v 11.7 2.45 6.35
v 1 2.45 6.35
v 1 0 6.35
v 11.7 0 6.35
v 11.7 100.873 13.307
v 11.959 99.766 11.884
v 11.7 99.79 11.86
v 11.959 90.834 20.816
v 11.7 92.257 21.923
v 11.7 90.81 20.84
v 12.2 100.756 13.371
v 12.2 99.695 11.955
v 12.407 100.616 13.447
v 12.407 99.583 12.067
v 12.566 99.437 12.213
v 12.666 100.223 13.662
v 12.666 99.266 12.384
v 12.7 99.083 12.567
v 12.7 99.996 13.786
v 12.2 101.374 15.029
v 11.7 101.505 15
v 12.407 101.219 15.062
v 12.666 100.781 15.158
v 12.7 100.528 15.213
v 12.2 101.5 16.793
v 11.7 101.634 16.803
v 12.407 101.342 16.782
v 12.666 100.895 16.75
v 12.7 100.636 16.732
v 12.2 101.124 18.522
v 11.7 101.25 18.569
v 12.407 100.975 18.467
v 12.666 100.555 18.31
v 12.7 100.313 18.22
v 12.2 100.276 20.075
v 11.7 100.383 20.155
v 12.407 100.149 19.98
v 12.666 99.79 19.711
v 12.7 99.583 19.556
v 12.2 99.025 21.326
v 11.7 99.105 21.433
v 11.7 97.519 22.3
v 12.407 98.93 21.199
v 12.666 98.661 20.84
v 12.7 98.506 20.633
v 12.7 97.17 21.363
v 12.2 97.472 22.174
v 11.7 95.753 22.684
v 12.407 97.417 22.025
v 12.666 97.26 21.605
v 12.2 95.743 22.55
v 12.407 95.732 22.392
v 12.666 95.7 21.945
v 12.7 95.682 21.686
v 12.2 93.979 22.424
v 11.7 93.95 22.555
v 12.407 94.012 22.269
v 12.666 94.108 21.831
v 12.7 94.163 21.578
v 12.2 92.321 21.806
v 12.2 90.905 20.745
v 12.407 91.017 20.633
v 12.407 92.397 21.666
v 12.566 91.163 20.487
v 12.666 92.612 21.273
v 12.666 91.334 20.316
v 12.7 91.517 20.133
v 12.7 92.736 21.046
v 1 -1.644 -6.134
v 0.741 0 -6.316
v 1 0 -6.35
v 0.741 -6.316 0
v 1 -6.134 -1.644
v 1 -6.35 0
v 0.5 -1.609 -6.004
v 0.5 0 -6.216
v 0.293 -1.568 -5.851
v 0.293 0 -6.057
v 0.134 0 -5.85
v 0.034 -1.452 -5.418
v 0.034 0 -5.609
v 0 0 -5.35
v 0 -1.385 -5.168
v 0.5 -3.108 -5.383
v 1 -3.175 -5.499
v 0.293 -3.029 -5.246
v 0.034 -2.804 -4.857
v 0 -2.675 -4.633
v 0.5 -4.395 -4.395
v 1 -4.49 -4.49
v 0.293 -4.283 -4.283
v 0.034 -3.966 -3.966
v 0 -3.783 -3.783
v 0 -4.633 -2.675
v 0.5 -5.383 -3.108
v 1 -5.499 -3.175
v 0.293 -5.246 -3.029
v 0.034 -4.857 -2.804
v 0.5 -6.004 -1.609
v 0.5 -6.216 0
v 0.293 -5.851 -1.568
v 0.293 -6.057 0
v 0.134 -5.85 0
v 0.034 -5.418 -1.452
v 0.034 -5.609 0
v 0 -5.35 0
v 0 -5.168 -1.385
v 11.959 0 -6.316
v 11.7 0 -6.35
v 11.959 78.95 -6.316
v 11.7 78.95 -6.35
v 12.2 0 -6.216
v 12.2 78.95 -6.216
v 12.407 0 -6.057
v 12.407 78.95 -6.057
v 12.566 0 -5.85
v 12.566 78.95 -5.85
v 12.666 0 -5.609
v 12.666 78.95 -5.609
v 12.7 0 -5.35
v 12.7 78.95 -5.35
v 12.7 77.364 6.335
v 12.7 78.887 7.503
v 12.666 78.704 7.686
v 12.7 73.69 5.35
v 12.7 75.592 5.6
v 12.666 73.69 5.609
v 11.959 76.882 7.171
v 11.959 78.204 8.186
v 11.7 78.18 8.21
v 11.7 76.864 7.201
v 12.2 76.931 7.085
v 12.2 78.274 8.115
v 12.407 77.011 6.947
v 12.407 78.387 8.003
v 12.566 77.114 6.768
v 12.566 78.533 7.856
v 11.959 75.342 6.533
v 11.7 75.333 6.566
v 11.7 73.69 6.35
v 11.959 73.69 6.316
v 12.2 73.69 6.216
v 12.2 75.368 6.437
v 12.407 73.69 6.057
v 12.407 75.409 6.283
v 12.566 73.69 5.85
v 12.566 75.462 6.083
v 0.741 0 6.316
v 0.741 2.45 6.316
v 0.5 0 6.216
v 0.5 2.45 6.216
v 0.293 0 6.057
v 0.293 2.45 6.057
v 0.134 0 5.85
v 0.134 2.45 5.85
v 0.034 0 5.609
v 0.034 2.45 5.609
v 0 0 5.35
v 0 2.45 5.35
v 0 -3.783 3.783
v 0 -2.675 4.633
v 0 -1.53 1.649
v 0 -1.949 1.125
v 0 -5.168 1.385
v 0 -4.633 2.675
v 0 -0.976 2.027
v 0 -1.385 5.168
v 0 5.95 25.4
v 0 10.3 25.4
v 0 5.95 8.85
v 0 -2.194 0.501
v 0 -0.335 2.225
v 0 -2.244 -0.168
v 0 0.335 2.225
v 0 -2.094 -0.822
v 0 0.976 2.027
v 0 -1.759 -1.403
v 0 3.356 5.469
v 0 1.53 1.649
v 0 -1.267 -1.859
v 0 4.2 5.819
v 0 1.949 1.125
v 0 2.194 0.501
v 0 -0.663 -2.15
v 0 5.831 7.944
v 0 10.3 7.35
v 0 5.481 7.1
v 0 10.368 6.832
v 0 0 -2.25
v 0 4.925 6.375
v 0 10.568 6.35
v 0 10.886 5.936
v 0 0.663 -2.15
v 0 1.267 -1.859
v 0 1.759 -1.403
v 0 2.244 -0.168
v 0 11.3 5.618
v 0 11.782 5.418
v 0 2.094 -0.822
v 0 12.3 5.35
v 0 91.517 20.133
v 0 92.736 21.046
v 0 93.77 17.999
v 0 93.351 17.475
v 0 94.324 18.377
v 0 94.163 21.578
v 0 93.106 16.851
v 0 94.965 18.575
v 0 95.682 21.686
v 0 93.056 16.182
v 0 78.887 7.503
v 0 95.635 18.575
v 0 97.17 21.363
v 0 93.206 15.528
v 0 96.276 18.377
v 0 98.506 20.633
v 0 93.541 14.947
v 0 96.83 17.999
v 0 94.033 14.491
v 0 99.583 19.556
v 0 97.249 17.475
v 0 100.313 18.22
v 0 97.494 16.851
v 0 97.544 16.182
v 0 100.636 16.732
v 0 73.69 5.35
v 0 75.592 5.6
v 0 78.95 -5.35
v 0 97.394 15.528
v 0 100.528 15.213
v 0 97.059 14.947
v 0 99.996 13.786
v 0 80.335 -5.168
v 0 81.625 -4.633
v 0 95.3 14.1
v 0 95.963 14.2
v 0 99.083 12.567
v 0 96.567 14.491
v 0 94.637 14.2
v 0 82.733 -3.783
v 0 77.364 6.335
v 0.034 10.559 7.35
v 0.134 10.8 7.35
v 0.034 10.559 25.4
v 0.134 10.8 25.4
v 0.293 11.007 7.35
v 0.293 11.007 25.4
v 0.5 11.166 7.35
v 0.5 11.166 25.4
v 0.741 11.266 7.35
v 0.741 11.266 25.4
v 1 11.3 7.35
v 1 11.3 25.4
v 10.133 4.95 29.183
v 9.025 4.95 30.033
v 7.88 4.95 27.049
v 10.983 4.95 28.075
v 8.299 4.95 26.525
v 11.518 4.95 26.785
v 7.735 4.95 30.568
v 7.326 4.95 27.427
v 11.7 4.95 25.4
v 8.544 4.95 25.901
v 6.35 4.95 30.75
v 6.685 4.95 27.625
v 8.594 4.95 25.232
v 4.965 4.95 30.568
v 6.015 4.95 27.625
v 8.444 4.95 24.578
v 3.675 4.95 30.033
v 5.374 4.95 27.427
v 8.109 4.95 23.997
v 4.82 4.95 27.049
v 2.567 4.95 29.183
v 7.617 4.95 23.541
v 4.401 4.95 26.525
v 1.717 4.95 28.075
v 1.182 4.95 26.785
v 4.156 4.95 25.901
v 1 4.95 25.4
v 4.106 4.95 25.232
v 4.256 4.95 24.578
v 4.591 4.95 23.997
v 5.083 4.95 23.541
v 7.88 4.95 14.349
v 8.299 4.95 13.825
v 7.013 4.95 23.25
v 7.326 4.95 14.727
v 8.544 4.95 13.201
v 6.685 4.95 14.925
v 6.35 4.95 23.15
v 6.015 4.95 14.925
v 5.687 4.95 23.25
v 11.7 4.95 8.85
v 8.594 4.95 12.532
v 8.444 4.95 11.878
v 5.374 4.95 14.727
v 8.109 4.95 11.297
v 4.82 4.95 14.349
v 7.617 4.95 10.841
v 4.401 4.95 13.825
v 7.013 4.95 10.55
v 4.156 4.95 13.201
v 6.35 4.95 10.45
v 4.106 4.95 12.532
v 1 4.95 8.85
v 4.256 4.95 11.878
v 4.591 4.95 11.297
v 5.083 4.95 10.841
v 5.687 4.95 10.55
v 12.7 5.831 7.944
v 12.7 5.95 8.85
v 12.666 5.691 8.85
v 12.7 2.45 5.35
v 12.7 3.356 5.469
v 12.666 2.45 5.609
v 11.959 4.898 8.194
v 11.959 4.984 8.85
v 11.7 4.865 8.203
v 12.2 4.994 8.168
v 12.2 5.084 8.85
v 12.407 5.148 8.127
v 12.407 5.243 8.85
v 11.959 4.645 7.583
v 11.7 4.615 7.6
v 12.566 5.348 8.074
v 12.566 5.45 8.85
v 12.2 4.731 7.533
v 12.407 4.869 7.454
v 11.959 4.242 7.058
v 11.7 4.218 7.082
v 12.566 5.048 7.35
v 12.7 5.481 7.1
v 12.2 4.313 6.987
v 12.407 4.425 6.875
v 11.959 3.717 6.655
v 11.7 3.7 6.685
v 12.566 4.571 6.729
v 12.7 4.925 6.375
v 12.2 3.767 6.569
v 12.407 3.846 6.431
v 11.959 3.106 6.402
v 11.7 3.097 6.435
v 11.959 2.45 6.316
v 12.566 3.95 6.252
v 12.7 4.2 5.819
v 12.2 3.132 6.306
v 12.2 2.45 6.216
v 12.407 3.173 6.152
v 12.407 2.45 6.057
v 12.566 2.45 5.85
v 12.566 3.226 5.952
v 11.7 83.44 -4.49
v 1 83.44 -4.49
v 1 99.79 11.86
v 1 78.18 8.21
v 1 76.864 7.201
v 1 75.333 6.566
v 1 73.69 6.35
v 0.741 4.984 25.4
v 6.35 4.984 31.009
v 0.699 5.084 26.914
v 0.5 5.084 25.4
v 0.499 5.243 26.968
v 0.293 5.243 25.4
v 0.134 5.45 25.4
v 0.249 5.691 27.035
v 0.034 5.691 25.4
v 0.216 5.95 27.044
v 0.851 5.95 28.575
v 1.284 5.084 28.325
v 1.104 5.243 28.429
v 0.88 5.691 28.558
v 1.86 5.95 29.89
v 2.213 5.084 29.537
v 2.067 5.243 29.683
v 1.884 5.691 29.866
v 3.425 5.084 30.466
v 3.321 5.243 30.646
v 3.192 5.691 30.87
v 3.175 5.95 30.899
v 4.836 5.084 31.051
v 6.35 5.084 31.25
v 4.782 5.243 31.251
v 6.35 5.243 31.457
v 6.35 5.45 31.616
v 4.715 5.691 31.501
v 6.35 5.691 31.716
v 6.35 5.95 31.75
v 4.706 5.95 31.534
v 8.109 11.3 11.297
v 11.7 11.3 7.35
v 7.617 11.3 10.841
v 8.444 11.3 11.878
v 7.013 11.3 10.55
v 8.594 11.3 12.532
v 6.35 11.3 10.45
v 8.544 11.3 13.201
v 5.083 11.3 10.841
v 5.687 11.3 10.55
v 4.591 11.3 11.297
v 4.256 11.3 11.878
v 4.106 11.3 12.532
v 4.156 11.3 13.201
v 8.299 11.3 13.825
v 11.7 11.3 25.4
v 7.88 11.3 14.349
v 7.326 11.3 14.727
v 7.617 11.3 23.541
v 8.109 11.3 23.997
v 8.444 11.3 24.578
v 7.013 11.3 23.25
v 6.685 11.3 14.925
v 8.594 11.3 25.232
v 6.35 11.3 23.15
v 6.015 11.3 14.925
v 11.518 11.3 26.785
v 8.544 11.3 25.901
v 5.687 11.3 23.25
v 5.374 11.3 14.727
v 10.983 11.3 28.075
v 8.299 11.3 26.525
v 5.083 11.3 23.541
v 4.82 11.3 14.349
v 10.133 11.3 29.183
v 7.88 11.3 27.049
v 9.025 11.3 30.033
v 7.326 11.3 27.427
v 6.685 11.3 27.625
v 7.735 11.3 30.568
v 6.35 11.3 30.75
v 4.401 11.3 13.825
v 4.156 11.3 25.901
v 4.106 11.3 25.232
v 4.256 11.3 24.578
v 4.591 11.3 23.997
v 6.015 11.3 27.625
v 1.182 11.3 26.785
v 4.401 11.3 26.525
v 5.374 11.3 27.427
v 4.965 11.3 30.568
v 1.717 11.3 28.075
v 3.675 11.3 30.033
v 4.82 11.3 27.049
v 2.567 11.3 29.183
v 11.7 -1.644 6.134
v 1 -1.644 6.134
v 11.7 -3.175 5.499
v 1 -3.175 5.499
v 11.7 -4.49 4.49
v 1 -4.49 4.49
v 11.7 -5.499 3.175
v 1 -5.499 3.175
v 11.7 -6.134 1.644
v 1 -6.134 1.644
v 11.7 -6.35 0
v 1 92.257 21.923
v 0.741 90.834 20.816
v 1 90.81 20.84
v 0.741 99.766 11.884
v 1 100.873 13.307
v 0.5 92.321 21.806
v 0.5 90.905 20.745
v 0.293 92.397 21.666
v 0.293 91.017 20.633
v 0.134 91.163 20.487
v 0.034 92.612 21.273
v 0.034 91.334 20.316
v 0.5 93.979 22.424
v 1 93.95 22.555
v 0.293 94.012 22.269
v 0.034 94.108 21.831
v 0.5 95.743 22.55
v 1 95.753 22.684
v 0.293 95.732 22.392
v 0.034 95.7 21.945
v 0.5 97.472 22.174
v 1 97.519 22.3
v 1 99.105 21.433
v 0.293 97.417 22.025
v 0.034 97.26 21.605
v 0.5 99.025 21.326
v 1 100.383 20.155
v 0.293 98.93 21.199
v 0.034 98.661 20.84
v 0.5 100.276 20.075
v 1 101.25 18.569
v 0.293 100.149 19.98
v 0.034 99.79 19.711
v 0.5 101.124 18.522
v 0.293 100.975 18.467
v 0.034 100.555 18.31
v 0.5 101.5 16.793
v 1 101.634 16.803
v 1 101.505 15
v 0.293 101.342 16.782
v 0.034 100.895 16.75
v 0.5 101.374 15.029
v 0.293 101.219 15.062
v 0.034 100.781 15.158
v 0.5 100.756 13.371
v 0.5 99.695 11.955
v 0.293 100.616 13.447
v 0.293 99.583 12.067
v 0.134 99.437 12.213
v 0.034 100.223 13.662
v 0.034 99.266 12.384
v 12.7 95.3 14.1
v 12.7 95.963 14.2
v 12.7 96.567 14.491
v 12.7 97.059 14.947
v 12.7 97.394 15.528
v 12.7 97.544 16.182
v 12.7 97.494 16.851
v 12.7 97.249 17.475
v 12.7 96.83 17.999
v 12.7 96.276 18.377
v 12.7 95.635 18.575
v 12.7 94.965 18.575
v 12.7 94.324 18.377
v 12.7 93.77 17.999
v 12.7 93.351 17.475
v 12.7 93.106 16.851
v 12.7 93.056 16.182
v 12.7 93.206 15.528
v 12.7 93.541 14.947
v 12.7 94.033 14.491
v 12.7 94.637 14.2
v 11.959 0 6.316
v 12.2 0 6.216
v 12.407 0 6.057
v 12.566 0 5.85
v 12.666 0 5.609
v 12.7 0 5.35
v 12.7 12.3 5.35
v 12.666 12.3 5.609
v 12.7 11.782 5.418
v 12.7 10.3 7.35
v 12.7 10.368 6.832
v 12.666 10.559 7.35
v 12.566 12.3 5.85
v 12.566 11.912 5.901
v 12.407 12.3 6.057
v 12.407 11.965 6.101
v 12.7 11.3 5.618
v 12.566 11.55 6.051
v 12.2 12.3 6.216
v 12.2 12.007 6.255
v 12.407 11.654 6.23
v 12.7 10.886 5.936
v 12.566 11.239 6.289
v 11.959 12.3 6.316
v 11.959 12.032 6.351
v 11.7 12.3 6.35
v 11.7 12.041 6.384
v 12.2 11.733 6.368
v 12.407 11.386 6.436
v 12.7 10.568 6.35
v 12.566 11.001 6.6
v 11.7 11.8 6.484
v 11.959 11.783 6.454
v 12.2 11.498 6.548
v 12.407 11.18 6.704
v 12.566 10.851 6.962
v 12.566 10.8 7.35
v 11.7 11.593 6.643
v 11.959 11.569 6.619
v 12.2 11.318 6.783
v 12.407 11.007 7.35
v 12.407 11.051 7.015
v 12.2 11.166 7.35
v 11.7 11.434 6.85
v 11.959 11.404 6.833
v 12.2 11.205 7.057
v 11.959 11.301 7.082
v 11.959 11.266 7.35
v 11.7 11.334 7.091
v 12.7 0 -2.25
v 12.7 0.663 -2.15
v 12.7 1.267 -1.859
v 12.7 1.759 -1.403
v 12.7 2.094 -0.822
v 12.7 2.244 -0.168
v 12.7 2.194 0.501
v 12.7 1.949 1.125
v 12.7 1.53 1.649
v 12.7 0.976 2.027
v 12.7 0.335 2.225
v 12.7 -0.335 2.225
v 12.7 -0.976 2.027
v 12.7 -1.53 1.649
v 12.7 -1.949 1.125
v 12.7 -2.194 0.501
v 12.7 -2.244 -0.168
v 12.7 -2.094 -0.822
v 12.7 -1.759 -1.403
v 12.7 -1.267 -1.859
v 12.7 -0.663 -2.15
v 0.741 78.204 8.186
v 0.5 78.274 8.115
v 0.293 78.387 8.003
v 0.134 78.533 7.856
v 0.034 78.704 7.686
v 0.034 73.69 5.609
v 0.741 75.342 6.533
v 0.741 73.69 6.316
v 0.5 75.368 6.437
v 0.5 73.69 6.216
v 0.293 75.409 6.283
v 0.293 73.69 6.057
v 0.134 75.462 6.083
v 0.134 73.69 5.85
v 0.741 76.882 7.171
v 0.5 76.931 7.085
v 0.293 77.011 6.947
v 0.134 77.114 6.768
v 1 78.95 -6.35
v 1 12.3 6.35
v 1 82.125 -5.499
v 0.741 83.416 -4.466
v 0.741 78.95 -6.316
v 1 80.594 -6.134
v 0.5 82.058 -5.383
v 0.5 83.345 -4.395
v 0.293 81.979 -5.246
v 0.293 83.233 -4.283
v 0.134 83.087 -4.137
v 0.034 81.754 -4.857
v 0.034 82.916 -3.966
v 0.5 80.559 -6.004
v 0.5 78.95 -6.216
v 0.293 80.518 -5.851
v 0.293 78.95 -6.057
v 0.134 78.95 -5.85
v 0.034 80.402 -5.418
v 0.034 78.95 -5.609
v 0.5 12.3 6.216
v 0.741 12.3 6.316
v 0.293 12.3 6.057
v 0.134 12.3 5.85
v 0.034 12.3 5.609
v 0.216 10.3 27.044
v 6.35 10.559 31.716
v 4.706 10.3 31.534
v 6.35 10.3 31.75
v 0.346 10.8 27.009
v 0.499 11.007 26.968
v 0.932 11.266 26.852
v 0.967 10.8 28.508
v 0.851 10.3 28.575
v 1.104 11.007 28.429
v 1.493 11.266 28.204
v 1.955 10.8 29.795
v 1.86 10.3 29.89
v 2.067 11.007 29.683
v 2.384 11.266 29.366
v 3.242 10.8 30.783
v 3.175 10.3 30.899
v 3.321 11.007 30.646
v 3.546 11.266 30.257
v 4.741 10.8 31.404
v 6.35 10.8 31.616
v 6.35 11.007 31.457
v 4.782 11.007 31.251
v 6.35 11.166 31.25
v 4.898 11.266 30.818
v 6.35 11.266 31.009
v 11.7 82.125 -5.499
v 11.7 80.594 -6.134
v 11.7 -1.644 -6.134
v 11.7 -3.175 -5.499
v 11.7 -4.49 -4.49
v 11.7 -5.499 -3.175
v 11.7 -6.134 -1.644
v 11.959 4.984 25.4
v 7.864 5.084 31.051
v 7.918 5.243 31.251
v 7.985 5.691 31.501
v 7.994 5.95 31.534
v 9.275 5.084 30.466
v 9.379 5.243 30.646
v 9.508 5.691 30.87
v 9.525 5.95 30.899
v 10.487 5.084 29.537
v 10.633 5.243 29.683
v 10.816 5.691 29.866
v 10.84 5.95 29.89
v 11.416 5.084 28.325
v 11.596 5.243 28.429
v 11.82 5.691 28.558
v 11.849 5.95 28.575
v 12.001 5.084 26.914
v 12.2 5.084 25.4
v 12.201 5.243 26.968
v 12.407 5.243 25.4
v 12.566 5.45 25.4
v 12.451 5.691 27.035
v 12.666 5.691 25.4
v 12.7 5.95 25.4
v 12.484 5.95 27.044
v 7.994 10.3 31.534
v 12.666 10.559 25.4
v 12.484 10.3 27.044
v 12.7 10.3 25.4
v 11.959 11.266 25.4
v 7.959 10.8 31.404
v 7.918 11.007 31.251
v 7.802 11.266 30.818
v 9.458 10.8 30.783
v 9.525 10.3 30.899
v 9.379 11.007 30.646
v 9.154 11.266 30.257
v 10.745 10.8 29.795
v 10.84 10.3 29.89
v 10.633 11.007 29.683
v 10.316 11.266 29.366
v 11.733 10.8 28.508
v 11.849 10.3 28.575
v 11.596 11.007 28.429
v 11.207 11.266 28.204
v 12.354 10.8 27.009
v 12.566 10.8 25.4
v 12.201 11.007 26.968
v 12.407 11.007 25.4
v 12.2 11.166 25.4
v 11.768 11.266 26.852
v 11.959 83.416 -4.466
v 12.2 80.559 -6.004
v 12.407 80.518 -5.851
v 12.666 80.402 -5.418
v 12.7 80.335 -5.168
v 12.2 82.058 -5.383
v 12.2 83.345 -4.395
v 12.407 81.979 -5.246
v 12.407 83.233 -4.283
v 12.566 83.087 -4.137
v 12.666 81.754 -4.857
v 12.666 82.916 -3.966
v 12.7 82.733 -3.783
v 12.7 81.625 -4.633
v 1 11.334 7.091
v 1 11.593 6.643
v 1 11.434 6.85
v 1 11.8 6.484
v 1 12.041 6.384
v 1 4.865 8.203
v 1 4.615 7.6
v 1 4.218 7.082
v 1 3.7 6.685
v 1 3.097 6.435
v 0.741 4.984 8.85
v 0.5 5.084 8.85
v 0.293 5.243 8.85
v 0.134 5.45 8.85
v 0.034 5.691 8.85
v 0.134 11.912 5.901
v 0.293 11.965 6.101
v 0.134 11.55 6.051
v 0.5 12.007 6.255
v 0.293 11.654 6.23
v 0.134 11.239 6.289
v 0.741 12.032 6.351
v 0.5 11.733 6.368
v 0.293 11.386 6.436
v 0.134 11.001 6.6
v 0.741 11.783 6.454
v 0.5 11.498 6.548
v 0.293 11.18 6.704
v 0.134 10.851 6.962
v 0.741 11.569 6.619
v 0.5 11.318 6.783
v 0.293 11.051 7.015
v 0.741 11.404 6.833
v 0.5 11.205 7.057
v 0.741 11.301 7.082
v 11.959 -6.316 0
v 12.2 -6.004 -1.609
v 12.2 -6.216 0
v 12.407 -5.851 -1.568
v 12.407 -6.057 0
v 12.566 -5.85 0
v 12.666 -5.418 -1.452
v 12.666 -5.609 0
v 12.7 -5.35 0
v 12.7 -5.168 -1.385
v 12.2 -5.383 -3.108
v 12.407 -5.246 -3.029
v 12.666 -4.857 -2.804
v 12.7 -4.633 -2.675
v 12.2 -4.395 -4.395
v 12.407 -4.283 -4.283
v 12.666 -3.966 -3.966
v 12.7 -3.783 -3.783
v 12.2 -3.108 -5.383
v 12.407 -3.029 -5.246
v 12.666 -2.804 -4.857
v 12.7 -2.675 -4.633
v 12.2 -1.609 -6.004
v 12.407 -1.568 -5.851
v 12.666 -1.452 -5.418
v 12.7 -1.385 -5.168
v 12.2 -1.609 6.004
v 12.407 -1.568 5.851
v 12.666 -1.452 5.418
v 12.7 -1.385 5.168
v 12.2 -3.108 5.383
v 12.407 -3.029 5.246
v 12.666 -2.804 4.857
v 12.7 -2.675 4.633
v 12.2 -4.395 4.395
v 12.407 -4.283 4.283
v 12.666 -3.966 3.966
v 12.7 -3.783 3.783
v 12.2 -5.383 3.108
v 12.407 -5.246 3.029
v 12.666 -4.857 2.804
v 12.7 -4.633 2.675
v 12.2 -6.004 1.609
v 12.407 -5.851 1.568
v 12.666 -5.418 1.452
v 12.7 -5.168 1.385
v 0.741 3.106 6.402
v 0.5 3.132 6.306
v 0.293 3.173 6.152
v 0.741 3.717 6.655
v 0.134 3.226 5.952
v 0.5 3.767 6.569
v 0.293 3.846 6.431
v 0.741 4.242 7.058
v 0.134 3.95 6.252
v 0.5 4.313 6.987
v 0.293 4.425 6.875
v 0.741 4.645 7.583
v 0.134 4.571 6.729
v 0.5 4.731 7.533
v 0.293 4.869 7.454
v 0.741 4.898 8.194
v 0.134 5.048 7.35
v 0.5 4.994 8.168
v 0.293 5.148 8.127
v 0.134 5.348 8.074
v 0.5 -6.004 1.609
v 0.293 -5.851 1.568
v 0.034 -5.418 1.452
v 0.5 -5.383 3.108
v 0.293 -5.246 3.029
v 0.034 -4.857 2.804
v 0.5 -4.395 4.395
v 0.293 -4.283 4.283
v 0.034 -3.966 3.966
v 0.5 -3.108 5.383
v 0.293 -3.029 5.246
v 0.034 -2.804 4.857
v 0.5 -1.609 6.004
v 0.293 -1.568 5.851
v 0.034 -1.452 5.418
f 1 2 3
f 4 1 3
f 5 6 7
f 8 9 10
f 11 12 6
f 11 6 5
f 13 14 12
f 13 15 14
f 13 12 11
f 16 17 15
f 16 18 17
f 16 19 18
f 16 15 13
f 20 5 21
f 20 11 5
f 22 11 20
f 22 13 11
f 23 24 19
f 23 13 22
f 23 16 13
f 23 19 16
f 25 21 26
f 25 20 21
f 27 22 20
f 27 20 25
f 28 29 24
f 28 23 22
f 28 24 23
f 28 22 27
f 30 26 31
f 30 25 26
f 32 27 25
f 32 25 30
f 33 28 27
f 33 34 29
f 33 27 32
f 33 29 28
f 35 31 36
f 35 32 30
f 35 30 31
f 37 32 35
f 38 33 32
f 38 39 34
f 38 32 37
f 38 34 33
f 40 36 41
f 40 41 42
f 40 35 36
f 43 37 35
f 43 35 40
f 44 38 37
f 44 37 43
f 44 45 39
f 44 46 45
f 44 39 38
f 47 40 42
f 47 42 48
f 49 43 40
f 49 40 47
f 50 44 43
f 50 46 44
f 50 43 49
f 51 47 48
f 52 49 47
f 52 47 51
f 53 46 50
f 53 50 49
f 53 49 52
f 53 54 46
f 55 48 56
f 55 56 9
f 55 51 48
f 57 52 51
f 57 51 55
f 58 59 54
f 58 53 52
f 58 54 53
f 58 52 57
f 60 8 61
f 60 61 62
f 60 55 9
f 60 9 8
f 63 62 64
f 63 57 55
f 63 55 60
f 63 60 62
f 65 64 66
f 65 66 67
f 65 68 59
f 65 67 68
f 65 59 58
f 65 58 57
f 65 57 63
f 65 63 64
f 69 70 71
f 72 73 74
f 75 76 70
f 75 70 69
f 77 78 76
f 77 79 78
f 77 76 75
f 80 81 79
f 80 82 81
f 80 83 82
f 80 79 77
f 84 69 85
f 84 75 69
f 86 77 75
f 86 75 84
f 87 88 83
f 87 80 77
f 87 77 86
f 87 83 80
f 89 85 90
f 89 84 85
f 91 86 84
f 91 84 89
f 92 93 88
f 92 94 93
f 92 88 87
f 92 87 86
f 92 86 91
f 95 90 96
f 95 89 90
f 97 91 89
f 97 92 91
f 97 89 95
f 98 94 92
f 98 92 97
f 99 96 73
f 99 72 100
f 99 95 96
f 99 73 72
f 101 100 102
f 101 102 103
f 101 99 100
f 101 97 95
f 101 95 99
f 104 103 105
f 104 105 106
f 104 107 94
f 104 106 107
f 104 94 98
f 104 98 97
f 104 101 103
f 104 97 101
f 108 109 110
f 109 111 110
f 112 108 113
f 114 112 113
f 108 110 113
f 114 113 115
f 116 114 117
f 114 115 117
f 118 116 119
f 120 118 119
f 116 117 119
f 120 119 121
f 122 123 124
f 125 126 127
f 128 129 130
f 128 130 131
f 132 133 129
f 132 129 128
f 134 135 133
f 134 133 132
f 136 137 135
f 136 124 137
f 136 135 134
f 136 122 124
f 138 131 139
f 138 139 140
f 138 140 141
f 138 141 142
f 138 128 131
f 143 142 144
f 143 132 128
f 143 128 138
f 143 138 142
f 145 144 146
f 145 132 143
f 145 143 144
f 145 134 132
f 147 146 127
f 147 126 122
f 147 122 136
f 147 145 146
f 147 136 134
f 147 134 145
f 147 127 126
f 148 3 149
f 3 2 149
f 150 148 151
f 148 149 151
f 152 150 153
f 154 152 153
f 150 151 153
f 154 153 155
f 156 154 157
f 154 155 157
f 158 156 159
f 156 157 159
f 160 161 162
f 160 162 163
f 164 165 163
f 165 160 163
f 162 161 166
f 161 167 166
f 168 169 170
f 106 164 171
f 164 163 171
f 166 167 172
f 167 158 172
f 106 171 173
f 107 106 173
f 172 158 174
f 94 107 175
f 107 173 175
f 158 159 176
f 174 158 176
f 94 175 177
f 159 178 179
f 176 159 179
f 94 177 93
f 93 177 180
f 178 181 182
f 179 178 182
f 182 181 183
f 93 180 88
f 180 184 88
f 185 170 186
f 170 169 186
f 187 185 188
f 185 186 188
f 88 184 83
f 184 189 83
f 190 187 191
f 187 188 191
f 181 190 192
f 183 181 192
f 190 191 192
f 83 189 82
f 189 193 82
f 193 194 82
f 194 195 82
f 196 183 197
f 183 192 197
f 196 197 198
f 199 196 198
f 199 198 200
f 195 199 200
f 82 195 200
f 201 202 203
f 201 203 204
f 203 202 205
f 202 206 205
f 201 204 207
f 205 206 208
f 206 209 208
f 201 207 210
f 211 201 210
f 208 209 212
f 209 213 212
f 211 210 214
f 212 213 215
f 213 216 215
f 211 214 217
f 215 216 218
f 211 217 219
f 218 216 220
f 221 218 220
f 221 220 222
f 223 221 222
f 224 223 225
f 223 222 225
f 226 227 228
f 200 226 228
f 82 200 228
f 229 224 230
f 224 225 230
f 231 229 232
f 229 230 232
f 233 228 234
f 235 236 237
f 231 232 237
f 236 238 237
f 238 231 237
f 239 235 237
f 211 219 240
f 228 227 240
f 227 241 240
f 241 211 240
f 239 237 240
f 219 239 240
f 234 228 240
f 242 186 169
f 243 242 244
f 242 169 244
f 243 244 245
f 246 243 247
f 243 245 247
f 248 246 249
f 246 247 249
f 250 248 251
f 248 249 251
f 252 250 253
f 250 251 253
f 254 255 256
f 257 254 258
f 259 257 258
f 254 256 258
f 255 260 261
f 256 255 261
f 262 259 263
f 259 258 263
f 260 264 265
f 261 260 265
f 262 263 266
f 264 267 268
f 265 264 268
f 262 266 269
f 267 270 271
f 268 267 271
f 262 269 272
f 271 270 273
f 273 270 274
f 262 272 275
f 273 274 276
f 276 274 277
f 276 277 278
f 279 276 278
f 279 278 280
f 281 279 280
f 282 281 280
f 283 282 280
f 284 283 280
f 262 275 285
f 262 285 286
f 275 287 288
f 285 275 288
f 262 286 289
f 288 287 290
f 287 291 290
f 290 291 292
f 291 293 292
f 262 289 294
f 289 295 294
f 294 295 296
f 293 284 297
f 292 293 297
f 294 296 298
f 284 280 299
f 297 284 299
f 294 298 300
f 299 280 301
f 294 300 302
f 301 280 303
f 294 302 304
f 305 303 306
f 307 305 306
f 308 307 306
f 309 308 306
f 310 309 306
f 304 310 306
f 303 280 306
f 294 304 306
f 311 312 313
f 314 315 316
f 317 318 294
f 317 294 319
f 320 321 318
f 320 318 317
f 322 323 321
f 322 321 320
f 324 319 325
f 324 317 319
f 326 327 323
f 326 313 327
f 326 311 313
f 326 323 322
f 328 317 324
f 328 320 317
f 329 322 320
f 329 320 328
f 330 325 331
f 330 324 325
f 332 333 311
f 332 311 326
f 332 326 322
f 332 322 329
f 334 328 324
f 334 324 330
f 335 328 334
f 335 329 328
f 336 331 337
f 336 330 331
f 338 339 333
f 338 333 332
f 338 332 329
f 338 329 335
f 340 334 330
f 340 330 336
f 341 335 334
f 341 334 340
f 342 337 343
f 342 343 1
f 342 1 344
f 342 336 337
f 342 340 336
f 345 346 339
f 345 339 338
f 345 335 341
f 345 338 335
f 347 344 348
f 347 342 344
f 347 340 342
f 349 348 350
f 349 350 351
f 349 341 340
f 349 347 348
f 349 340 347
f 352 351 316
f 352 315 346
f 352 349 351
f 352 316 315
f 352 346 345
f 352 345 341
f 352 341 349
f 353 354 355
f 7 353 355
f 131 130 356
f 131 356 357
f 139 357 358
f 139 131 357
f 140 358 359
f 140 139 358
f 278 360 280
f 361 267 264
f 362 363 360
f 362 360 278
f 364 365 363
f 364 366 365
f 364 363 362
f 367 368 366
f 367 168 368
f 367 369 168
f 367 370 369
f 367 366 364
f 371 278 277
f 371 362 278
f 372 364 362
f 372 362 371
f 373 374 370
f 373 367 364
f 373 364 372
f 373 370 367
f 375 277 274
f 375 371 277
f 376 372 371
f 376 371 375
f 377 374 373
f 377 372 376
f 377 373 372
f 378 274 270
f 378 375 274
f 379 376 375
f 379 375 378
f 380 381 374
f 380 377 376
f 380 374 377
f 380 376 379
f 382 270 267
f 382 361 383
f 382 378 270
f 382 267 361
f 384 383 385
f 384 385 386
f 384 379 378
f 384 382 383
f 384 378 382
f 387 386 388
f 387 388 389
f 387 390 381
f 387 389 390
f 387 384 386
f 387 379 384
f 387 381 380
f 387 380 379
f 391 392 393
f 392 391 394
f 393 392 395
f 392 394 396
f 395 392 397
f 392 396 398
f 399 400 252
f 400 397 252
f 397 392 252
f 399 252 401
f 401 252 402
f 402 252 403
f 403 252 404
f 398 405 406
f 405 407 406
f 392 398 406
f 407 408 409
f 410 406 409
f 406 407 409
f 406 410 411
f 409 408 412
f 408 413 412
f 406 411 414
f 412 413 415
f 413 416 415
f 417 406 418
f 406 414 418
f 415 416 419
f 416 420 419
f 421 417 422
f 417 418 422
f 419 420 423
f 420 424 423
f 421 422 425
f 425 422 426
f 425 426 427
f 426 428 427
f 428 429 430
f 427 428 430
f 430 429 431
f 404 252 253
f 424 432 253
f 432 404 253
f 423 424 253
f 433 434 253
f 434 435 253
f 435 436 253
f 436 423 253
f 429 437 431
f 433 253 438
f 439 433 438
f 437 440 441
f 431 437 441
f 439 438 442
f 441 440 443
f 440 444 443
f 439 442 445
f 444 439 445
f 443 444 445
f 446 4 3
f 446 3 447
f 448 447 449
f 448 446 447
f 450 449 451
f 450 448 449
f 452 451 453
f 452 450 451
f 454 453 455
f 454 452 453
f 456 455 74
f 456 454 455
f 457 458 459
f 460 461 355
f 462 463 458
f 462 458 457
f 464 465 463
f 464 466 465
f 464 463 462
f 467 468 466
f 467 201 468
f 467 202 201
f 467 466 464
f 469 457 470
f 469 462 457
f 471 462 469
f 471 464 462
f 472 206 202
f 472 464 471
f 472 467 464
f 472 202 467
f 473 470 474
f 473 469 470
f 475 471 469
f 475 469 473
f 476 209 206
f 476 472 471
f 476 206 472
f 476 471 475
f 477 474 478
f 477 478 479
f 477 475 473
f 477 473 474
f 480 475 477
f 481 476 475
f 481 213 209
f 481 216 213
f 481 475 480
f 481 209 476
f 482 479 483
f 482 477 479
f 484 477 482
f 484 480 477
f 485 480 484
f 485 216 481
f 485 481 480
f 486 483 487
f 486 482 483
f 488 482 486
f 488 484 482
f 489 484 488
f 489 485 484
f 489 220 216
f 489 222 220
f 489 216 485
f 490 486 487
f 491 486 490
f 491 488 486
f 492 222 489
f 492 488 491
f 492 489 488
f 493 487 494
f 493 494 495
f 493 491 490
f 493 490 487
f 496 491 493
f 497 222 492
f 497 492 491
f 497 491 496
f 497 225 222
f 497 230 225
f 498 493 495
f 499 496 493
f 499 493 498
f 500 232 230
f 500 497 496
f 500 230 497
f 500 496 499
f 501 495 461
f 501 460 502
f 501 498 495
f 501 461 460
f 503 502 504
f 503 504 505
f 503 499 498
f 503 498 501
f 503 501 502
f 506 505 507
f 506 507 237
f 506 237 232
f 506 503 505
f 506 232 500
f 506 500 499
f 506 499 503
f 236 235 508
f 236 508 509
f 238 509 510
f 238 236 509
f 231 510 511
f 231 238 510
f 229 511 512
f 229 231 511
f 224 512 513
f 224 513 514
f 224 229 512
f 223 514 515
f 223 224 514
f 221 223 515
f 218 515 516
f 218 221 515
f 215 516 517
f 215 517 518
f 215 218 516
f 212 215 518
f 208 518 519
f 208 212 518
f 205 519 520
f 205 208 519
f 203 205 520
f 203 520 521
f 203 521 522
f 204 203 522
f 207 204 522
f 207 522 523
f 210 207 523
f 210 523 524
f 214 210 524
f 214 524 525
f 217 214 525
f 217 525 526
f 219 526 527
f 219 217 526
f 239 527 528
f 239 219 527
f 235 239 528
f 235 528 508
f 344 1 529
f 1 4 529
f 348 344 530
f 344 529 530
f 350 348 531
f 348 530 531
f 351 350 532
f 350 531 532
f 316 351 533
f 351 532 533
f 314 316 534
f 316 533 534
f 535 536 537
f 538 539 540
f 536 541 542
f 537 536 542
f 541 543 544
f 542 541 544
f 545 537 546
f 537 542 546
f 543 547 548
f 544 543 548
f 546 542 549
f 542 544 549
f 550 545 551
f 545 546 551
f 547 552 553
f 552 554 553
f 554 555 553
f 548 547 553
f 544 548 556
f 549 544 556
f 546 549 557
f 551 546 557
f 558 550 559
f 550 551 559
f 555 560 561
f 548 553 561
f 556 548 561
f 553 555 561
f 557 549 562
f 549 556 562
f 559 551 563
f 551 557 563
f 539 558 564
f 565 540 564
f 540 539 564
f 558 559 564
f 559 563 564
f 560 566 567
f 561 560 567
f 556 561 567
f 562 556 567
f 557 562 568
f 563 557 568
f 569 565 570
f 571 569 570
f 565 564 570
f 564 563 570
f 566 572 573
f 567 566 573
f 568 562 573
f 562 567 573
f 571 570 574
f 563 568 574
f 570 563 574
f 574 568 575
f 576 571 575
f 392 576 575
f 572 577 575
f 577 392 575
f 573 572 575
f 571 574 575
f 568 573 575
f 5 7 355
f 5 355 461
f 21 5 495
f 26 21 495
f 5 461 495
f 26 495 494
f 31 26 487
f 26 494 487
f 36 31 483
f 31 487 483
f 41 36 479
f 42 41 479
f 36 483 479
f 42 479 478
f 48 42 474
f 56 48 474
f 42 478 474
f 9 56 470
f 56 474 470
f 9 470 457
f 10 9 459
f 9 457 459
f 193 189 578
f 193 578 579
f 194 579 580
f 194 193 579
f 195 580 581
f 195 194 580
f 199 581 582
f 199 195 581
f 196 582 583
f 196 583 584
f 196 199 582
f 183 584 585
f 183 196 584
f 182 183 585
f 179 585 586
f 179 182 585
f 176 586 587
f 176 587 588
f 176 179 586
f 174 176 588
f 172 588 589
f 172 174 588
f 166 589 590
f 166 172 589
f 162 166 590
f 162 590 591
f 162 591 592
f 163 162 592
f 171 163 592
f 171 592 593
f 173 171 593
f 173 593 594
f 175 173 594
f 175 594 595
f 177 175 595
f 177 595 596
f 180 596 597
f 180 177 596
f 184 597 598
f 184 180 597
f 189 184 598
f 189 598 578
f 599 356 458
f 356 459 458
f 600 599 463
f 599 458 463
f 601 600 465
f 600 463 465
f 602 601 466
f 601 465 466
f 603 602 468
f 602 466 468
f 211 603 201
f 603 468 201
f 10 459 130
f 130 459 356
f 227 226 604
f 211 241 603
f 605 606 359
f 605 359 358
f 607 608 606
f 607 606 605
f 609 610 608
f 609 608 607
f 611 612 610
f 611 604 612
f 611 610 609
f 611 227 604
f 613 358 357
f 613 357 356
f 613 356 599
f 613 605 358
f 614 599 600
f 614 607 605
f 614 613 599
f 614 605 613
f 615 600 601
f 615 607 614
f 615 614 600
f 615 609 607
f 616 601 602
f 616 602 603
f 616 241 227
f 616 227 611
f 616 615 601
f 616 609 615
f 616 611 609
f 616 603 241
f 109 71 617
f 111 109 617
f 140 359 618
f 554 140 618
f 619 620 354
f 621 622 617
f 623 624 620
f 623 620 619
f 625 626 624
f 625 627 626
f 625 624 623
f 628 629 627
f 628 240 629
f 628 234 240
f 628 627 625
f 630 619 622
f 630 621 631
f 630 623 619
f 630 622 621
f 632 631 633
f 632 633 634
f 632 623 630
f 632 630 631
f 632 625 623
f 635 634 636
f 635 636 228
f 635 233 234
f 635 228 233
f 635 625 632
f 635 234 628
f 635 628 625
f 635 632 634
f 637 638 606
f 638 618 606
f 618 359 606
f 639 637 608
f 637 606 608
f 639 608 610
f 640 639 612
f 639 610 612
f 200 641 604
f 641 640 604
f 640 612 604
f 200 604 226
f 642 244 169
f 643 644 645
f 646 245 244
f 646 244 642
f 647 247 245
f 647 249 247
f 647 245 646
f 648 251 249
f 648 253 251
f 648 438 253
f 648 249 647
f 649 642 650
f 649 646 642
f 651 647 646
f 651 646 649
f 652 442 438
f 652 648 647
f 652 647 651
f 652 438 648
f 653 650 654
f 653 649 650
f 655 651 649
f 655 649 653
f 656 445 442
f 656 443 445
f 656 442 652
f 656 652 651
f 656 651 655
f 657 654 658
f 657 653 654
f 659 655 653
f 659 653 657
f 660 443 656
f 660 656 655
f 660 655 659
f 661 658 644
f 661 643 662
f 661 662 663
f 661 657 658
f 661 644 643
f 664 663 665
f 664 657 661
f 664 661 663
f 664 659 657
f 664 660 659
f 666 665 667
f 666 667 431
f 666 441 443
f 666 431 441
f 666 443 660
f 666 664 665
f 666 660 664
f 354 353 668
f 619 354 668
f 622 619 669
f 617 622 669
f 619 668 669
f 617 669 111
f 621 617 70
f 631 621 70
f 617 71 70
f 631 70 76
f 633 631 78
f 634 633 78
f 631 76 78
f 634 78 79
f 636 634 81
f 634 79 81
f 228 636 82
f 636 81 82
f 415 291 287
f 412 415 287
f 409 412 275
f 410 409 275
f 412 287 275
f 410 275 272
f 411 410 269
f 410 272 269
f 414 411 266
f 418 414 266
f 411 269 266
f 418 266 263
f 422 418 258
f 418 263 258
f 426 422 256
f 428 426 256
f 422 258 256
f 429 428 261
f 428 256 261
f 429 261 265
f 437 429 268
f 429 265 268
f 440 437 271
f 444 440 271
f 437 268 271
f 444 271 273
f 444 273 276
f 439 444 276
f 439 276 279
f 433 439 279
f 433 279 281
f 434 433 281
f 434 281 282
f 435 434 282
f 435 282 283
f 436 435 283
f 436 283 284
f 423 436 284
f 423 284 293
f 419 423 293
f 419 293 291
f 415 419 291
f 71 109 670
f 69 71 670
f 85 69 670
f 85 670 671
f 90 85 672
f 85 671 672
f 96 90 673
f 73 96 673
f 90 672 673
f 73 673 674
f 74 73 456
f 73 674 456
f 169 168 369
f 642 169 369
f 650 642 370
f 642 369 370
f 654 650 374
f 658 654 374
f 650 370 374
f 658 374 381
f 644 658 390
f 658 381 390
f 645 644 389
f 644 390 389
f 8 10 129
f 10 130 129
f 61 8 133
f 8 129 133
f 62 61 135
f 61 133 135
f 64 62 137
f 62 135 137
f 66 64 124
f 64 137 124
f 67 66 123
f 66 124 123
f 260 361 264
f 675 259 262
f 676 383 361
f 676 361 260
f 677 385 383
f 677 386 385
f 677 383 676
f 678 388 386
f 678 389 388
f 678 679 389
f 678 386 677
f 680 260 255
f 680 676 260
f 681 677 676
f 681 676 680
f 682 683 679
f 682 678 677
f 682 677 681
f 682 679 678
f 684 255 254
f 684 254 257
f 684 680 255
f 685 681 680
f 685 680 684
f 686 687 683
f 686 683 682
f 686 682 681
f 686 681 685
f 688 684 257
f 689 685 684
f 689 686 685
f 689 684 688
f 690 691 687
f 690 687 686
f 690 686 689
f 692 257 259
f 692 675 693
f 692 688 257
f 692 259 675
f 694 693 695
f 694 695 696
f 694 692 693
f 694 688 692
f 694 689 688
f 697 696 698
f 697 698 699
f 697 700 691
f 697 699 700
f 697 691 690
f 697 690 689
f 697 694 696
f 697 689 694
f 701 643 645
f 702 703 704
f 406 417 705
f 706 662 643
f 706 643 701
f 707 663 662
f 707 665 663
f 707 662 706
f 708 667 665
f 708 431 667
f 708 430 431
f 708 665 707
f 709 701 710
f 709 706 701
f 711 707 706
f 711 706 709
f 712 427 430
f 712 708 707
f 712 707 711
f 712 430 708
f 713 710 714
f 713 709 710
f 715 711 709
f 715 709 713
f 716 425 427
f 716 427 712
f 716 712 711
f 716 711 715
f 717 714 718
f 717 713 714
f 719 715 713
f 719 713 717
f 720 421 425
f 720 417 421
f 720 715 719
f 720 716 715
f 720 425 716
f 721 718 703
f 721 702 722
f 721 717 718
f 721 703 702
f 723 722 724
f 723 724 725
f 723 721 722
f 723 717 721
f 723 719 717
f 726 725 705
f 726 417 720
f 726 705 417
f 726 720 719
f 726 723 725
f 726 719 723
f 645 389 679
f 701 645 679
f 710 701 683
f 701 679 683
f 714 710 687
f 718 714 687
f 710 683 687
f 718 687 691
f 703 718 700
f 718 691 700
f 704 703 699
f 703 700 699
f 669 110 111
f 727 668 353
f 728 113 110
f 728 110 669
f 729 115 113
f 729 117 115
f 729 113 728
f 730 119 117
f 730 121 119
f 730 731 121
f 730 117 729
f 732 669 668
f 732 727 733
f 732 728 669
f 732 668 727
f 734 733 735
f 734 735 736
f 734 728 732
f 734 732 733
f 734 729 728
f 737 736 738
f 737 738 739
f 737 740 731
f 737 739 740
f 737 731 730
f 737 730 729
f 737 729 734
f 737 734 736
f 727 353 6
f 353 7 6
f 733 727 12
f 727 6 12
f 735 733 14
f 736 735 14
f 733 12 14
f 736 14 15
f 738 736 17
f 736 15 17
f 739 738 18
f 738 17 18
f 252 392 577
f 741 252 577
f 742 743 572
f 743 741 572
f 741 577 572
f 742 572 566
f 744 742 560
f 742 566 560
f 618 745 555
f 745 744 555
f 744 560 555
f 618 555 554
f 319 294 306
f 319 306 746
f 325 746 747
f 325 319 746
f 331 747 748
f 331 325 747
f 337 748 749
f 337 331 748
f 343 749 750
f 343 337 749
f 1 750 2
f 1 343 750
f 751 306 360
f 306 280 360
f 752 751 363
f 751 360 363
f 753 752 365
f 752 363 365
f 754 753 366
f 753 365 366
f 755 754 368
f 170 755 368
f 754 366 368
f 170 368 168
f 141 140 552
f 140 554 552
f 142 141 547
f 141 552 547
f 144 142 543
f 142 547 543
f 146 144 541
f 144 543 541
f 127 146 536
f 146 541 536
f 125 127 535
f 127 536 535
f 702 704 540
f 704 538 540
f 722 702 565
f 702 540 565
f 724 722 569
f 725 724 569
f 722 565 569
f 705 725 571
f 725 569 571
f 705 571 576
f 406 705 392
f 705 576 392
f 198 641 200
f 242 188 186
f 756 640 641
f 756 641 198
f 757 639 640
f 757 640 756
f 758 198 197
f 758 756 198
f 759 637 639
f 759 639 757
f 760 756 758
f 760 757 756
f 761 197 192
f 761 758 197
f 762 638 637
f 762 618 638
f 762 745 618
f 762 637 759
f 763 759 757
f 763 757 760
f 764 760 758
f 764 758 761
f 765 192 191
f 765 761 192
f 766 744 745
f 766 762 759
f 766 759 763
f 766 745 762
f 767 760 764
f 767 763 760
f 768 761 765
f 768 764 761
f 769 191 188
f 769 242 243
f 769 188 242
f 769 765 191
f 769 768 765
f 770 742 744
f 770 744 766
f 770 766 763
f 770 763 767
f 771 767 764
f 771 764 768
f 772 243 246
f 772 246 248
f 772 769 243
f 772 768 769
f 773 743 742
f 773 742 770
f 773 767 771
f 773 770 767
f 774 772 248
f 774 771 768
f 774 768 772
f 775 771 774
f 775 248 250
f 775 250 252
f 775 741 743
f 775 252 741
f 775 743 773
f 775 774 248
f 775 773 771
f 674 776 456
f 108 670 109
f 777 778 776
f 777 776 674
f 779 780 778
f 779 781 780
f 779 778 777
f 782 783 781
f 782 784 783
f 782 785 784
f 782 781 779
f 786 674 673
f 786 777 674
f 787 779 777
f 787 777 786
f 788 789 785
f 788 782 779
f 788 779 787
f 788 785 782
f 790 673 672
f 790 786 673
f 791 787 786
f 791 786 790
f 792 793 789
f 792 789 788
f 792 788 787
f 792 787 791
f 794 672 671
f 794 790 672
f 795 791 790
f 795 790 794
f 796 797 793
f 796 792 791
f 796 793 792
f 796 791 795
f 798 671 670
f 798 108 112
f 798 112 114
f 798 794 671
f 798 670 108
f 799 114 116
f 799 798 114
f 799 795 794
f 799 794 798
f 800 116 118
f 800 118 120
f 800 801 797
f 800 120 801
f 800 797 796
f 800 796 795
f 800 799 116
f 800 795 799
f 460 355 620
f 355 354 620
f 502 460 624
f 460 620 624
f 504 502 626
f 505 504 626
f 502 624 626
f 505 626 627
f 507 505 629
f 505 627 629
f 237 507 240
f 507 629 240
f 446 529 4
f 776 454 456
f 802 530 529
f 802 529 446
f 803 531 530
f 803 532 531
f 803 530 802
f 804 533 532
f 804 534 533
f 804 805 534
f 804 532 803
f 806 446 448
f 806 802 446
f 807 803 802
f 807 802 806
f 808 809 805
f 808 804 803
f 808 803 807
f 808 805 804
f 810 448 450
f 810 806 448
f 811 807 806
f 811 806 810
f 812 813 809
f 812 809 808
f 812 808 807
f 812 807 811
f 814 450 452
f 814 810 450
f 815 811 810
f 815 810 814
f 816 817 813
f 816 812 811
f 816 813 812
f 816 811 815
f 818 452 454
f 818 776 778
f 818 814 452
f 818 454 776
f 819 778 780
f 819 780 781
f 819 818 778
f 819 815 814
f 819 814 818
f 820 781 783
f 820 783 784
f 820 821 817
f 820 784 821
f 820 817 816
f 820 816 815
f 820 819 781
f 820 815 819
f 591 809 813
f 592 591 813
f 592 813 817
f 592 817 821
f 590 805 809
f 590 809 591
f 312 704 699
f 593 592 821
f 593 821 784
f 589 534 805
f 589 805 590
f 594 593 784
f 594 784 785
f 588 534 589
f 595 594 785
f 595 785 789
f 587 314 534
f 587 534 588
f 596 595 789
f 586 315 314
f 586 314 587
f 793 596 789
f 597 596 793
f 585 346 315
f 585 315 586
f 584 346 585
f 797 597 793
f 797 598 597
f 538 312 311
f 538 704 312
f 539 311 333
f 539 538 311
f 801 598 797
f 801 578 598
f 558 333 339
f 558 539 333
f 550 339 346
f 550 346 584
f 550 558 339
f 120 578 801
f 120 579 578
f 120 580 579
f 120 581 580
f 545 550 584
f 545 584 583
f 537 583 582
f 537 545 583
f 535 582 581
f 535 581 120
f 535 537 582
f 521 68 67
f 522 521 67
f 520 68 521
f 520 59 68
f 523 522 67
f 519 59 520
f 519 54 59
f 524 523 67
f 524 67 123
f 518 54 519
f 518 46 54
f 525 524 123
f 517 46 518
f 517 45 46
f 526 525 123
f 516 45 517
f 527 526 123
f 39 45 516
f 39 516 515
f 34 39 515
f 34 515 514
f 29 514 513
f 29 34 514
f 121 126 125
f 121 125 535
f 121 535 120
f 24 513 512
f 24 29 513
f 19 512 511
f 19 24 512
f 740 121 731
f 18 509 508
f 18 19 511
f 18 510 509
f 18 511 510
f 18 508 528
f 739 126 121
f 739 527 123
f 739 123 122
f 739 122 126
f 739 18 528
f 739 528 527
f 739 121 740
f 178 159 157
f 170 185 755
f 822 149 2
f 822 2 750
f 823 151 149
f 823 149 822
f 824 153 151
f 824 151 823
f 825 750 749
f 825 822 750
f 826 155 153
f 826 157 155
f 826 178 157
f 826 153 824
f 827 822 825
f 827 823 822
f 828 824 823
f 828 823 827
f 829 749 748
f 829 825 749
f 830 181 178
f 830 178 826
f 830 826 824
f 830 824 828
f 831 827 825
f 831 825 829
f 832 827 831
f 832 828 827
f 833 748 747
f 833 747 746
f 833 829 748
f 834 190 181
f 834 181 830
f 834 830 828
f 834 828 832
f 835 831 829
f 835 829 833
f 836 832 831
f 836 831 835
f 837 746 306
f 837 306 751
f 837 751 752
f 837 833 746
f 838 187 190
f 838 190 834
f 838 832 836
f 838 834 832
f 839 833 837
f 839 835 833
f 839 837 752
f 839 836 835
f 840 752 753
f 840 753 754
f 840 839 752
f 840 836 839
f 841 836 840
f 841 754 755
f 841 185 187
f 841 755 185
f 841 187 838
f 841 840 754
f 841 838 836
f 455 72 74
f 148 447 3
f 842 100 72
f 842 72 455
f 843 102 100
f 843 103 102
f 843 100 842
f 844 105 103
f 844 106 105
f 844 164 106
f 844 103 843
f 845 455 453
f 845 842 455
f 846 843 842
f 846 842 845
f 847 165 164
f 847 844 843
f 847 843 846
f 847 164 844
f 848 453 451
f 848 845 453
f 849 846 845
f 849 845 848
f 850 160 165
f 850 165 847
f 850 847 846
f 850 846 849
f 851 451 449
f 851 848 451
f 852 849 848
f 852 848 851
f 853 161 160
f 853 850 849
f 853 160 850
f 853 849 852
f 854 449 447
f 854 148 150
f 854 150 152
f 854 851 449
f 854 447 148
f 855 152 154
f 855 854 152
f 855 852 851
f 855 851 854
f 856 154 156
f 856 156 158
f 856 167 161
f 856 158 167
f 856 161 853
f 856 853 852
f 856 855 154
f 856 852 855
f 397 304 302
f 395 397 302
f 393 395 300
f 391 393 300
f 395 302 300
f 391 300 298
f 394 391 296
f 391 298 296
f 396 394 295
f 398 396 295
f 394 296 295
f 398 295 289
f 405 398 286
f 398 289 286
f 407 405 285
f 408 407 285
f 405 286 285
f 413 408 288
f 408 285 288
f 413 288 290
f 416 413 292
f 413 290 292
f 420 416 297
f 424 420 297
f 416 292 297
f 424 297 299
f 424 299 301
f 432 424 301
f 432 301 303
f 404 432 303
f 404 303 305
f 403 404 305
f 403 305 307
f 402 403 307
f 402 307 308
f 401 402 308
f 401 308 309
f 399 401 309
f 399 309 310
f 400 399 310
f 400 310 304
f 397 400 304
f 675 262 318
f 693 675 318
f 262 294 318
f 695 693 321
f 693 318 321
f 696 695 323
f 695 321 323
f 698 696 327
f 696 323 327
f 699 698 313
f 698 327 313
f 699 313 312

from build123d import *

# Parameters (mm, degrees)
SKETCH1_R           = 2.25
SKETCH1_R_2         = 6.35
BOSS_EXTRUDE1_DEPTH = 12.7
FILLET1_R           = 6.35
FILLET3_R           = 6.35
FILLET5_R           = 2.5
FILLET4_R           = 1
CUT_EXTRUDE1_REACH  = 104.568
SKETCH2_R           = 2.25


with BuildPart() as part:
    # Sketch1 → Boss-Extrude1 (new body)
    # profile 1 of 2: a face of its own
    with BuildSketch(Plane(origin=(0, 0, 0), x_dir=(0, 0, -1), z_dir=(1, 0, 0))):
        with BuildLine():
            Line((-6.35, 76.319743879), (-6.35, 11.3))
            Line((-6.35, 11.3), (-31.75, 11.3))
            Line((-31.75, 11.3), (-31.75, 4.95))
            Line((-31.75, 4.95), (-6.35, 4.95))
            Line((-6.35, 4.95), (-6.35, -6.35))
            Line((-6.35, -6.35), (6.35, -6.35))
            Line((6.35, -6.35), (6.35, 11.3))
            Line((6.35, 11.3), (6.35, 81.580256121))
            Line((6.35, 81.580256121), (-11.859871939, 99.790128061))
            ThreePointArc((-11.859871939, 99.790128061), (-10.483364969, 97.730039796), (-10, 95.3))
            ThreePointArc((-10, 95.3), (-13.919960204, 89.433364969), (-20.840128061, 90.809871939))
            Line((-20.840128061, 90.809871939), (-6.35, 76.319743879))
        make_face()
        Circle(SKETCH1_R, mode=Mode.SUBTRACT)
    # profile 2 of 2: a face of its own
    with BuildSketch(Plane(origin=(0, 0, 0), x_dir=(0, 0, -1), z_dir=(1, 0, 0))):
        with Locations((-16.35, 95.3)):
            Circle(SKETCH1_R_2)
        with Locations((-16.35, 95.3)):
            Circle(SKETCH1_R, mode=Mode.SUBTRACT)
    extrude(amount=BOSS_EXTRUDE1_DEPTH)

    # Fillet1
    fillet1_edges = [part.edges().sort_by_distance(p)[0] for p in [
        (6.35, 81.580256121, -6.35),
        (6.35, 76.319743879, 6.35),
        (6.35, -6.35, -6.35),
        (6.35, -6.35, 6.35),
    ]]
    fillet(fillet1_edges, radius=FILLET1_R - 0.0001)  # a hair under: the kernel refuses the full size

    # Fillet3
    fillet3_edges = [part.edges().sort_by_distance(p)[0] for p in [
        (0, 8.125, 31.75),
        (12.7, 8.125, 31.75),
    ]]
    fillet(fillet3_edges, radius=FILLET3_R - 0.0001)  # a hair under: the kernel refuses the full size

    # Fillet5
    fillet5_edges = [part.edges().sort_by_distance(p)[0] for p in [
        (6.35, 4.95, 6.35),
    ]]
    fillet(fillet5_edges, radius=FILLET5_R)

    # Fillet4
    fillet4_edges = [part.edges().sort_by_distance(p)[0] for p in [
        (12.7, 99.790128061, 20.840128061),
        (0, 11.3, 15.87505),
        (0, 42.49476459, 6.35),
        (0, 99.790128061, 20.840128061),
        (0, 91.615113416, 3.684857295),
        (12.7, 42.49476459, 6.35),
        (6.35, 11.3, 6.35),
        (12.7, 11.3, 15.87505),
        (0, 39.474970711, -6.35),
        (0, 84.494729234, 14.524985355),
        (0, -4.49015735, 4.49015735),
        (0, -4.49015735, -4.49015735),
        (0, 81.380042949, -5.866642643),
        (12.7, 39.474970711, -6.35),
        (12.7, 84.494729234, 14.524985355),
        (12.7, -4.49015735, 4.49015735),
        (12.7, -4.49015735, -4.49015735),
        (12.7, 81.380042949, -5.866642643),
        (0, 76.119530706, 6.833357357),
        (12.7, 76.119530706, 6.833357357),
        (0, 4.95, 17.12505),
        (12.7, 4.95, 17.12505),
        (10.84015735, 4.95, 29.89015735),
        (1.85984265, 4.95, 29.89015735),
        (10.84015735, 11.3, 29.89015735),
        (1.85984265, 11.3, 29.89015735),
        (12.7, 91.615113416, 3.684857295),
        (0, 1.22495, 6.35),
        (12.7, 1.22495, 6.35),
        (0, 4.217766953, 7.082233047),
        (12.7, 4.217766953, 7.082233047),
    ]]
    fillet(fillet4_edges, radius=FILLET4_R)

    # Sketch2 → Cut-Extrude1 (cut, up to next)
    with BuildSketch(Plane.XZ.offset(-4.95), mode=Mode.PRIVATE) as cut_extrude1_sk1:
        with Locations(Location((6.35, 12.7, 0), (0, 0, 270))):
            Circle(SKETCH2_R)
    cut_extrude1_tool1 = extrude(cut_extrude1_sk1.sketch, amount=-CUT_EXTRUDE1_REACH, mode=Mode.PRIVATE) & part.part
    # Sketch2 → Cut-Extrude1 (cut, up to next)
    with BuildSketch(Plane.XZ.offset(-4.95), mode=Mode.PRIVATE) as cut_extrude1_sk2:
        with Locations(Location((6.35, 25.4, 0), (0, 0, 270))):
            Circle(SKETCH2_R)
    cut_extrude1_tool2 = extrude(cut_extrude1_sk2.sketch, amount=-CUT_EXTRUDE1_REACH, mode=Mode.PRIVATE) & part.part
    add(cut_extrude1_tool1.solids().sort_by_distance((6.35, 4.95, 12.7))[0], mode=Mode.SUBTRACT)
    add(cut_extrude1_tool2.solids().sort_by_distance((6.35, 4.95, 25.4))[0], mode=Mode.SUBTRACT)


solid = part.part
